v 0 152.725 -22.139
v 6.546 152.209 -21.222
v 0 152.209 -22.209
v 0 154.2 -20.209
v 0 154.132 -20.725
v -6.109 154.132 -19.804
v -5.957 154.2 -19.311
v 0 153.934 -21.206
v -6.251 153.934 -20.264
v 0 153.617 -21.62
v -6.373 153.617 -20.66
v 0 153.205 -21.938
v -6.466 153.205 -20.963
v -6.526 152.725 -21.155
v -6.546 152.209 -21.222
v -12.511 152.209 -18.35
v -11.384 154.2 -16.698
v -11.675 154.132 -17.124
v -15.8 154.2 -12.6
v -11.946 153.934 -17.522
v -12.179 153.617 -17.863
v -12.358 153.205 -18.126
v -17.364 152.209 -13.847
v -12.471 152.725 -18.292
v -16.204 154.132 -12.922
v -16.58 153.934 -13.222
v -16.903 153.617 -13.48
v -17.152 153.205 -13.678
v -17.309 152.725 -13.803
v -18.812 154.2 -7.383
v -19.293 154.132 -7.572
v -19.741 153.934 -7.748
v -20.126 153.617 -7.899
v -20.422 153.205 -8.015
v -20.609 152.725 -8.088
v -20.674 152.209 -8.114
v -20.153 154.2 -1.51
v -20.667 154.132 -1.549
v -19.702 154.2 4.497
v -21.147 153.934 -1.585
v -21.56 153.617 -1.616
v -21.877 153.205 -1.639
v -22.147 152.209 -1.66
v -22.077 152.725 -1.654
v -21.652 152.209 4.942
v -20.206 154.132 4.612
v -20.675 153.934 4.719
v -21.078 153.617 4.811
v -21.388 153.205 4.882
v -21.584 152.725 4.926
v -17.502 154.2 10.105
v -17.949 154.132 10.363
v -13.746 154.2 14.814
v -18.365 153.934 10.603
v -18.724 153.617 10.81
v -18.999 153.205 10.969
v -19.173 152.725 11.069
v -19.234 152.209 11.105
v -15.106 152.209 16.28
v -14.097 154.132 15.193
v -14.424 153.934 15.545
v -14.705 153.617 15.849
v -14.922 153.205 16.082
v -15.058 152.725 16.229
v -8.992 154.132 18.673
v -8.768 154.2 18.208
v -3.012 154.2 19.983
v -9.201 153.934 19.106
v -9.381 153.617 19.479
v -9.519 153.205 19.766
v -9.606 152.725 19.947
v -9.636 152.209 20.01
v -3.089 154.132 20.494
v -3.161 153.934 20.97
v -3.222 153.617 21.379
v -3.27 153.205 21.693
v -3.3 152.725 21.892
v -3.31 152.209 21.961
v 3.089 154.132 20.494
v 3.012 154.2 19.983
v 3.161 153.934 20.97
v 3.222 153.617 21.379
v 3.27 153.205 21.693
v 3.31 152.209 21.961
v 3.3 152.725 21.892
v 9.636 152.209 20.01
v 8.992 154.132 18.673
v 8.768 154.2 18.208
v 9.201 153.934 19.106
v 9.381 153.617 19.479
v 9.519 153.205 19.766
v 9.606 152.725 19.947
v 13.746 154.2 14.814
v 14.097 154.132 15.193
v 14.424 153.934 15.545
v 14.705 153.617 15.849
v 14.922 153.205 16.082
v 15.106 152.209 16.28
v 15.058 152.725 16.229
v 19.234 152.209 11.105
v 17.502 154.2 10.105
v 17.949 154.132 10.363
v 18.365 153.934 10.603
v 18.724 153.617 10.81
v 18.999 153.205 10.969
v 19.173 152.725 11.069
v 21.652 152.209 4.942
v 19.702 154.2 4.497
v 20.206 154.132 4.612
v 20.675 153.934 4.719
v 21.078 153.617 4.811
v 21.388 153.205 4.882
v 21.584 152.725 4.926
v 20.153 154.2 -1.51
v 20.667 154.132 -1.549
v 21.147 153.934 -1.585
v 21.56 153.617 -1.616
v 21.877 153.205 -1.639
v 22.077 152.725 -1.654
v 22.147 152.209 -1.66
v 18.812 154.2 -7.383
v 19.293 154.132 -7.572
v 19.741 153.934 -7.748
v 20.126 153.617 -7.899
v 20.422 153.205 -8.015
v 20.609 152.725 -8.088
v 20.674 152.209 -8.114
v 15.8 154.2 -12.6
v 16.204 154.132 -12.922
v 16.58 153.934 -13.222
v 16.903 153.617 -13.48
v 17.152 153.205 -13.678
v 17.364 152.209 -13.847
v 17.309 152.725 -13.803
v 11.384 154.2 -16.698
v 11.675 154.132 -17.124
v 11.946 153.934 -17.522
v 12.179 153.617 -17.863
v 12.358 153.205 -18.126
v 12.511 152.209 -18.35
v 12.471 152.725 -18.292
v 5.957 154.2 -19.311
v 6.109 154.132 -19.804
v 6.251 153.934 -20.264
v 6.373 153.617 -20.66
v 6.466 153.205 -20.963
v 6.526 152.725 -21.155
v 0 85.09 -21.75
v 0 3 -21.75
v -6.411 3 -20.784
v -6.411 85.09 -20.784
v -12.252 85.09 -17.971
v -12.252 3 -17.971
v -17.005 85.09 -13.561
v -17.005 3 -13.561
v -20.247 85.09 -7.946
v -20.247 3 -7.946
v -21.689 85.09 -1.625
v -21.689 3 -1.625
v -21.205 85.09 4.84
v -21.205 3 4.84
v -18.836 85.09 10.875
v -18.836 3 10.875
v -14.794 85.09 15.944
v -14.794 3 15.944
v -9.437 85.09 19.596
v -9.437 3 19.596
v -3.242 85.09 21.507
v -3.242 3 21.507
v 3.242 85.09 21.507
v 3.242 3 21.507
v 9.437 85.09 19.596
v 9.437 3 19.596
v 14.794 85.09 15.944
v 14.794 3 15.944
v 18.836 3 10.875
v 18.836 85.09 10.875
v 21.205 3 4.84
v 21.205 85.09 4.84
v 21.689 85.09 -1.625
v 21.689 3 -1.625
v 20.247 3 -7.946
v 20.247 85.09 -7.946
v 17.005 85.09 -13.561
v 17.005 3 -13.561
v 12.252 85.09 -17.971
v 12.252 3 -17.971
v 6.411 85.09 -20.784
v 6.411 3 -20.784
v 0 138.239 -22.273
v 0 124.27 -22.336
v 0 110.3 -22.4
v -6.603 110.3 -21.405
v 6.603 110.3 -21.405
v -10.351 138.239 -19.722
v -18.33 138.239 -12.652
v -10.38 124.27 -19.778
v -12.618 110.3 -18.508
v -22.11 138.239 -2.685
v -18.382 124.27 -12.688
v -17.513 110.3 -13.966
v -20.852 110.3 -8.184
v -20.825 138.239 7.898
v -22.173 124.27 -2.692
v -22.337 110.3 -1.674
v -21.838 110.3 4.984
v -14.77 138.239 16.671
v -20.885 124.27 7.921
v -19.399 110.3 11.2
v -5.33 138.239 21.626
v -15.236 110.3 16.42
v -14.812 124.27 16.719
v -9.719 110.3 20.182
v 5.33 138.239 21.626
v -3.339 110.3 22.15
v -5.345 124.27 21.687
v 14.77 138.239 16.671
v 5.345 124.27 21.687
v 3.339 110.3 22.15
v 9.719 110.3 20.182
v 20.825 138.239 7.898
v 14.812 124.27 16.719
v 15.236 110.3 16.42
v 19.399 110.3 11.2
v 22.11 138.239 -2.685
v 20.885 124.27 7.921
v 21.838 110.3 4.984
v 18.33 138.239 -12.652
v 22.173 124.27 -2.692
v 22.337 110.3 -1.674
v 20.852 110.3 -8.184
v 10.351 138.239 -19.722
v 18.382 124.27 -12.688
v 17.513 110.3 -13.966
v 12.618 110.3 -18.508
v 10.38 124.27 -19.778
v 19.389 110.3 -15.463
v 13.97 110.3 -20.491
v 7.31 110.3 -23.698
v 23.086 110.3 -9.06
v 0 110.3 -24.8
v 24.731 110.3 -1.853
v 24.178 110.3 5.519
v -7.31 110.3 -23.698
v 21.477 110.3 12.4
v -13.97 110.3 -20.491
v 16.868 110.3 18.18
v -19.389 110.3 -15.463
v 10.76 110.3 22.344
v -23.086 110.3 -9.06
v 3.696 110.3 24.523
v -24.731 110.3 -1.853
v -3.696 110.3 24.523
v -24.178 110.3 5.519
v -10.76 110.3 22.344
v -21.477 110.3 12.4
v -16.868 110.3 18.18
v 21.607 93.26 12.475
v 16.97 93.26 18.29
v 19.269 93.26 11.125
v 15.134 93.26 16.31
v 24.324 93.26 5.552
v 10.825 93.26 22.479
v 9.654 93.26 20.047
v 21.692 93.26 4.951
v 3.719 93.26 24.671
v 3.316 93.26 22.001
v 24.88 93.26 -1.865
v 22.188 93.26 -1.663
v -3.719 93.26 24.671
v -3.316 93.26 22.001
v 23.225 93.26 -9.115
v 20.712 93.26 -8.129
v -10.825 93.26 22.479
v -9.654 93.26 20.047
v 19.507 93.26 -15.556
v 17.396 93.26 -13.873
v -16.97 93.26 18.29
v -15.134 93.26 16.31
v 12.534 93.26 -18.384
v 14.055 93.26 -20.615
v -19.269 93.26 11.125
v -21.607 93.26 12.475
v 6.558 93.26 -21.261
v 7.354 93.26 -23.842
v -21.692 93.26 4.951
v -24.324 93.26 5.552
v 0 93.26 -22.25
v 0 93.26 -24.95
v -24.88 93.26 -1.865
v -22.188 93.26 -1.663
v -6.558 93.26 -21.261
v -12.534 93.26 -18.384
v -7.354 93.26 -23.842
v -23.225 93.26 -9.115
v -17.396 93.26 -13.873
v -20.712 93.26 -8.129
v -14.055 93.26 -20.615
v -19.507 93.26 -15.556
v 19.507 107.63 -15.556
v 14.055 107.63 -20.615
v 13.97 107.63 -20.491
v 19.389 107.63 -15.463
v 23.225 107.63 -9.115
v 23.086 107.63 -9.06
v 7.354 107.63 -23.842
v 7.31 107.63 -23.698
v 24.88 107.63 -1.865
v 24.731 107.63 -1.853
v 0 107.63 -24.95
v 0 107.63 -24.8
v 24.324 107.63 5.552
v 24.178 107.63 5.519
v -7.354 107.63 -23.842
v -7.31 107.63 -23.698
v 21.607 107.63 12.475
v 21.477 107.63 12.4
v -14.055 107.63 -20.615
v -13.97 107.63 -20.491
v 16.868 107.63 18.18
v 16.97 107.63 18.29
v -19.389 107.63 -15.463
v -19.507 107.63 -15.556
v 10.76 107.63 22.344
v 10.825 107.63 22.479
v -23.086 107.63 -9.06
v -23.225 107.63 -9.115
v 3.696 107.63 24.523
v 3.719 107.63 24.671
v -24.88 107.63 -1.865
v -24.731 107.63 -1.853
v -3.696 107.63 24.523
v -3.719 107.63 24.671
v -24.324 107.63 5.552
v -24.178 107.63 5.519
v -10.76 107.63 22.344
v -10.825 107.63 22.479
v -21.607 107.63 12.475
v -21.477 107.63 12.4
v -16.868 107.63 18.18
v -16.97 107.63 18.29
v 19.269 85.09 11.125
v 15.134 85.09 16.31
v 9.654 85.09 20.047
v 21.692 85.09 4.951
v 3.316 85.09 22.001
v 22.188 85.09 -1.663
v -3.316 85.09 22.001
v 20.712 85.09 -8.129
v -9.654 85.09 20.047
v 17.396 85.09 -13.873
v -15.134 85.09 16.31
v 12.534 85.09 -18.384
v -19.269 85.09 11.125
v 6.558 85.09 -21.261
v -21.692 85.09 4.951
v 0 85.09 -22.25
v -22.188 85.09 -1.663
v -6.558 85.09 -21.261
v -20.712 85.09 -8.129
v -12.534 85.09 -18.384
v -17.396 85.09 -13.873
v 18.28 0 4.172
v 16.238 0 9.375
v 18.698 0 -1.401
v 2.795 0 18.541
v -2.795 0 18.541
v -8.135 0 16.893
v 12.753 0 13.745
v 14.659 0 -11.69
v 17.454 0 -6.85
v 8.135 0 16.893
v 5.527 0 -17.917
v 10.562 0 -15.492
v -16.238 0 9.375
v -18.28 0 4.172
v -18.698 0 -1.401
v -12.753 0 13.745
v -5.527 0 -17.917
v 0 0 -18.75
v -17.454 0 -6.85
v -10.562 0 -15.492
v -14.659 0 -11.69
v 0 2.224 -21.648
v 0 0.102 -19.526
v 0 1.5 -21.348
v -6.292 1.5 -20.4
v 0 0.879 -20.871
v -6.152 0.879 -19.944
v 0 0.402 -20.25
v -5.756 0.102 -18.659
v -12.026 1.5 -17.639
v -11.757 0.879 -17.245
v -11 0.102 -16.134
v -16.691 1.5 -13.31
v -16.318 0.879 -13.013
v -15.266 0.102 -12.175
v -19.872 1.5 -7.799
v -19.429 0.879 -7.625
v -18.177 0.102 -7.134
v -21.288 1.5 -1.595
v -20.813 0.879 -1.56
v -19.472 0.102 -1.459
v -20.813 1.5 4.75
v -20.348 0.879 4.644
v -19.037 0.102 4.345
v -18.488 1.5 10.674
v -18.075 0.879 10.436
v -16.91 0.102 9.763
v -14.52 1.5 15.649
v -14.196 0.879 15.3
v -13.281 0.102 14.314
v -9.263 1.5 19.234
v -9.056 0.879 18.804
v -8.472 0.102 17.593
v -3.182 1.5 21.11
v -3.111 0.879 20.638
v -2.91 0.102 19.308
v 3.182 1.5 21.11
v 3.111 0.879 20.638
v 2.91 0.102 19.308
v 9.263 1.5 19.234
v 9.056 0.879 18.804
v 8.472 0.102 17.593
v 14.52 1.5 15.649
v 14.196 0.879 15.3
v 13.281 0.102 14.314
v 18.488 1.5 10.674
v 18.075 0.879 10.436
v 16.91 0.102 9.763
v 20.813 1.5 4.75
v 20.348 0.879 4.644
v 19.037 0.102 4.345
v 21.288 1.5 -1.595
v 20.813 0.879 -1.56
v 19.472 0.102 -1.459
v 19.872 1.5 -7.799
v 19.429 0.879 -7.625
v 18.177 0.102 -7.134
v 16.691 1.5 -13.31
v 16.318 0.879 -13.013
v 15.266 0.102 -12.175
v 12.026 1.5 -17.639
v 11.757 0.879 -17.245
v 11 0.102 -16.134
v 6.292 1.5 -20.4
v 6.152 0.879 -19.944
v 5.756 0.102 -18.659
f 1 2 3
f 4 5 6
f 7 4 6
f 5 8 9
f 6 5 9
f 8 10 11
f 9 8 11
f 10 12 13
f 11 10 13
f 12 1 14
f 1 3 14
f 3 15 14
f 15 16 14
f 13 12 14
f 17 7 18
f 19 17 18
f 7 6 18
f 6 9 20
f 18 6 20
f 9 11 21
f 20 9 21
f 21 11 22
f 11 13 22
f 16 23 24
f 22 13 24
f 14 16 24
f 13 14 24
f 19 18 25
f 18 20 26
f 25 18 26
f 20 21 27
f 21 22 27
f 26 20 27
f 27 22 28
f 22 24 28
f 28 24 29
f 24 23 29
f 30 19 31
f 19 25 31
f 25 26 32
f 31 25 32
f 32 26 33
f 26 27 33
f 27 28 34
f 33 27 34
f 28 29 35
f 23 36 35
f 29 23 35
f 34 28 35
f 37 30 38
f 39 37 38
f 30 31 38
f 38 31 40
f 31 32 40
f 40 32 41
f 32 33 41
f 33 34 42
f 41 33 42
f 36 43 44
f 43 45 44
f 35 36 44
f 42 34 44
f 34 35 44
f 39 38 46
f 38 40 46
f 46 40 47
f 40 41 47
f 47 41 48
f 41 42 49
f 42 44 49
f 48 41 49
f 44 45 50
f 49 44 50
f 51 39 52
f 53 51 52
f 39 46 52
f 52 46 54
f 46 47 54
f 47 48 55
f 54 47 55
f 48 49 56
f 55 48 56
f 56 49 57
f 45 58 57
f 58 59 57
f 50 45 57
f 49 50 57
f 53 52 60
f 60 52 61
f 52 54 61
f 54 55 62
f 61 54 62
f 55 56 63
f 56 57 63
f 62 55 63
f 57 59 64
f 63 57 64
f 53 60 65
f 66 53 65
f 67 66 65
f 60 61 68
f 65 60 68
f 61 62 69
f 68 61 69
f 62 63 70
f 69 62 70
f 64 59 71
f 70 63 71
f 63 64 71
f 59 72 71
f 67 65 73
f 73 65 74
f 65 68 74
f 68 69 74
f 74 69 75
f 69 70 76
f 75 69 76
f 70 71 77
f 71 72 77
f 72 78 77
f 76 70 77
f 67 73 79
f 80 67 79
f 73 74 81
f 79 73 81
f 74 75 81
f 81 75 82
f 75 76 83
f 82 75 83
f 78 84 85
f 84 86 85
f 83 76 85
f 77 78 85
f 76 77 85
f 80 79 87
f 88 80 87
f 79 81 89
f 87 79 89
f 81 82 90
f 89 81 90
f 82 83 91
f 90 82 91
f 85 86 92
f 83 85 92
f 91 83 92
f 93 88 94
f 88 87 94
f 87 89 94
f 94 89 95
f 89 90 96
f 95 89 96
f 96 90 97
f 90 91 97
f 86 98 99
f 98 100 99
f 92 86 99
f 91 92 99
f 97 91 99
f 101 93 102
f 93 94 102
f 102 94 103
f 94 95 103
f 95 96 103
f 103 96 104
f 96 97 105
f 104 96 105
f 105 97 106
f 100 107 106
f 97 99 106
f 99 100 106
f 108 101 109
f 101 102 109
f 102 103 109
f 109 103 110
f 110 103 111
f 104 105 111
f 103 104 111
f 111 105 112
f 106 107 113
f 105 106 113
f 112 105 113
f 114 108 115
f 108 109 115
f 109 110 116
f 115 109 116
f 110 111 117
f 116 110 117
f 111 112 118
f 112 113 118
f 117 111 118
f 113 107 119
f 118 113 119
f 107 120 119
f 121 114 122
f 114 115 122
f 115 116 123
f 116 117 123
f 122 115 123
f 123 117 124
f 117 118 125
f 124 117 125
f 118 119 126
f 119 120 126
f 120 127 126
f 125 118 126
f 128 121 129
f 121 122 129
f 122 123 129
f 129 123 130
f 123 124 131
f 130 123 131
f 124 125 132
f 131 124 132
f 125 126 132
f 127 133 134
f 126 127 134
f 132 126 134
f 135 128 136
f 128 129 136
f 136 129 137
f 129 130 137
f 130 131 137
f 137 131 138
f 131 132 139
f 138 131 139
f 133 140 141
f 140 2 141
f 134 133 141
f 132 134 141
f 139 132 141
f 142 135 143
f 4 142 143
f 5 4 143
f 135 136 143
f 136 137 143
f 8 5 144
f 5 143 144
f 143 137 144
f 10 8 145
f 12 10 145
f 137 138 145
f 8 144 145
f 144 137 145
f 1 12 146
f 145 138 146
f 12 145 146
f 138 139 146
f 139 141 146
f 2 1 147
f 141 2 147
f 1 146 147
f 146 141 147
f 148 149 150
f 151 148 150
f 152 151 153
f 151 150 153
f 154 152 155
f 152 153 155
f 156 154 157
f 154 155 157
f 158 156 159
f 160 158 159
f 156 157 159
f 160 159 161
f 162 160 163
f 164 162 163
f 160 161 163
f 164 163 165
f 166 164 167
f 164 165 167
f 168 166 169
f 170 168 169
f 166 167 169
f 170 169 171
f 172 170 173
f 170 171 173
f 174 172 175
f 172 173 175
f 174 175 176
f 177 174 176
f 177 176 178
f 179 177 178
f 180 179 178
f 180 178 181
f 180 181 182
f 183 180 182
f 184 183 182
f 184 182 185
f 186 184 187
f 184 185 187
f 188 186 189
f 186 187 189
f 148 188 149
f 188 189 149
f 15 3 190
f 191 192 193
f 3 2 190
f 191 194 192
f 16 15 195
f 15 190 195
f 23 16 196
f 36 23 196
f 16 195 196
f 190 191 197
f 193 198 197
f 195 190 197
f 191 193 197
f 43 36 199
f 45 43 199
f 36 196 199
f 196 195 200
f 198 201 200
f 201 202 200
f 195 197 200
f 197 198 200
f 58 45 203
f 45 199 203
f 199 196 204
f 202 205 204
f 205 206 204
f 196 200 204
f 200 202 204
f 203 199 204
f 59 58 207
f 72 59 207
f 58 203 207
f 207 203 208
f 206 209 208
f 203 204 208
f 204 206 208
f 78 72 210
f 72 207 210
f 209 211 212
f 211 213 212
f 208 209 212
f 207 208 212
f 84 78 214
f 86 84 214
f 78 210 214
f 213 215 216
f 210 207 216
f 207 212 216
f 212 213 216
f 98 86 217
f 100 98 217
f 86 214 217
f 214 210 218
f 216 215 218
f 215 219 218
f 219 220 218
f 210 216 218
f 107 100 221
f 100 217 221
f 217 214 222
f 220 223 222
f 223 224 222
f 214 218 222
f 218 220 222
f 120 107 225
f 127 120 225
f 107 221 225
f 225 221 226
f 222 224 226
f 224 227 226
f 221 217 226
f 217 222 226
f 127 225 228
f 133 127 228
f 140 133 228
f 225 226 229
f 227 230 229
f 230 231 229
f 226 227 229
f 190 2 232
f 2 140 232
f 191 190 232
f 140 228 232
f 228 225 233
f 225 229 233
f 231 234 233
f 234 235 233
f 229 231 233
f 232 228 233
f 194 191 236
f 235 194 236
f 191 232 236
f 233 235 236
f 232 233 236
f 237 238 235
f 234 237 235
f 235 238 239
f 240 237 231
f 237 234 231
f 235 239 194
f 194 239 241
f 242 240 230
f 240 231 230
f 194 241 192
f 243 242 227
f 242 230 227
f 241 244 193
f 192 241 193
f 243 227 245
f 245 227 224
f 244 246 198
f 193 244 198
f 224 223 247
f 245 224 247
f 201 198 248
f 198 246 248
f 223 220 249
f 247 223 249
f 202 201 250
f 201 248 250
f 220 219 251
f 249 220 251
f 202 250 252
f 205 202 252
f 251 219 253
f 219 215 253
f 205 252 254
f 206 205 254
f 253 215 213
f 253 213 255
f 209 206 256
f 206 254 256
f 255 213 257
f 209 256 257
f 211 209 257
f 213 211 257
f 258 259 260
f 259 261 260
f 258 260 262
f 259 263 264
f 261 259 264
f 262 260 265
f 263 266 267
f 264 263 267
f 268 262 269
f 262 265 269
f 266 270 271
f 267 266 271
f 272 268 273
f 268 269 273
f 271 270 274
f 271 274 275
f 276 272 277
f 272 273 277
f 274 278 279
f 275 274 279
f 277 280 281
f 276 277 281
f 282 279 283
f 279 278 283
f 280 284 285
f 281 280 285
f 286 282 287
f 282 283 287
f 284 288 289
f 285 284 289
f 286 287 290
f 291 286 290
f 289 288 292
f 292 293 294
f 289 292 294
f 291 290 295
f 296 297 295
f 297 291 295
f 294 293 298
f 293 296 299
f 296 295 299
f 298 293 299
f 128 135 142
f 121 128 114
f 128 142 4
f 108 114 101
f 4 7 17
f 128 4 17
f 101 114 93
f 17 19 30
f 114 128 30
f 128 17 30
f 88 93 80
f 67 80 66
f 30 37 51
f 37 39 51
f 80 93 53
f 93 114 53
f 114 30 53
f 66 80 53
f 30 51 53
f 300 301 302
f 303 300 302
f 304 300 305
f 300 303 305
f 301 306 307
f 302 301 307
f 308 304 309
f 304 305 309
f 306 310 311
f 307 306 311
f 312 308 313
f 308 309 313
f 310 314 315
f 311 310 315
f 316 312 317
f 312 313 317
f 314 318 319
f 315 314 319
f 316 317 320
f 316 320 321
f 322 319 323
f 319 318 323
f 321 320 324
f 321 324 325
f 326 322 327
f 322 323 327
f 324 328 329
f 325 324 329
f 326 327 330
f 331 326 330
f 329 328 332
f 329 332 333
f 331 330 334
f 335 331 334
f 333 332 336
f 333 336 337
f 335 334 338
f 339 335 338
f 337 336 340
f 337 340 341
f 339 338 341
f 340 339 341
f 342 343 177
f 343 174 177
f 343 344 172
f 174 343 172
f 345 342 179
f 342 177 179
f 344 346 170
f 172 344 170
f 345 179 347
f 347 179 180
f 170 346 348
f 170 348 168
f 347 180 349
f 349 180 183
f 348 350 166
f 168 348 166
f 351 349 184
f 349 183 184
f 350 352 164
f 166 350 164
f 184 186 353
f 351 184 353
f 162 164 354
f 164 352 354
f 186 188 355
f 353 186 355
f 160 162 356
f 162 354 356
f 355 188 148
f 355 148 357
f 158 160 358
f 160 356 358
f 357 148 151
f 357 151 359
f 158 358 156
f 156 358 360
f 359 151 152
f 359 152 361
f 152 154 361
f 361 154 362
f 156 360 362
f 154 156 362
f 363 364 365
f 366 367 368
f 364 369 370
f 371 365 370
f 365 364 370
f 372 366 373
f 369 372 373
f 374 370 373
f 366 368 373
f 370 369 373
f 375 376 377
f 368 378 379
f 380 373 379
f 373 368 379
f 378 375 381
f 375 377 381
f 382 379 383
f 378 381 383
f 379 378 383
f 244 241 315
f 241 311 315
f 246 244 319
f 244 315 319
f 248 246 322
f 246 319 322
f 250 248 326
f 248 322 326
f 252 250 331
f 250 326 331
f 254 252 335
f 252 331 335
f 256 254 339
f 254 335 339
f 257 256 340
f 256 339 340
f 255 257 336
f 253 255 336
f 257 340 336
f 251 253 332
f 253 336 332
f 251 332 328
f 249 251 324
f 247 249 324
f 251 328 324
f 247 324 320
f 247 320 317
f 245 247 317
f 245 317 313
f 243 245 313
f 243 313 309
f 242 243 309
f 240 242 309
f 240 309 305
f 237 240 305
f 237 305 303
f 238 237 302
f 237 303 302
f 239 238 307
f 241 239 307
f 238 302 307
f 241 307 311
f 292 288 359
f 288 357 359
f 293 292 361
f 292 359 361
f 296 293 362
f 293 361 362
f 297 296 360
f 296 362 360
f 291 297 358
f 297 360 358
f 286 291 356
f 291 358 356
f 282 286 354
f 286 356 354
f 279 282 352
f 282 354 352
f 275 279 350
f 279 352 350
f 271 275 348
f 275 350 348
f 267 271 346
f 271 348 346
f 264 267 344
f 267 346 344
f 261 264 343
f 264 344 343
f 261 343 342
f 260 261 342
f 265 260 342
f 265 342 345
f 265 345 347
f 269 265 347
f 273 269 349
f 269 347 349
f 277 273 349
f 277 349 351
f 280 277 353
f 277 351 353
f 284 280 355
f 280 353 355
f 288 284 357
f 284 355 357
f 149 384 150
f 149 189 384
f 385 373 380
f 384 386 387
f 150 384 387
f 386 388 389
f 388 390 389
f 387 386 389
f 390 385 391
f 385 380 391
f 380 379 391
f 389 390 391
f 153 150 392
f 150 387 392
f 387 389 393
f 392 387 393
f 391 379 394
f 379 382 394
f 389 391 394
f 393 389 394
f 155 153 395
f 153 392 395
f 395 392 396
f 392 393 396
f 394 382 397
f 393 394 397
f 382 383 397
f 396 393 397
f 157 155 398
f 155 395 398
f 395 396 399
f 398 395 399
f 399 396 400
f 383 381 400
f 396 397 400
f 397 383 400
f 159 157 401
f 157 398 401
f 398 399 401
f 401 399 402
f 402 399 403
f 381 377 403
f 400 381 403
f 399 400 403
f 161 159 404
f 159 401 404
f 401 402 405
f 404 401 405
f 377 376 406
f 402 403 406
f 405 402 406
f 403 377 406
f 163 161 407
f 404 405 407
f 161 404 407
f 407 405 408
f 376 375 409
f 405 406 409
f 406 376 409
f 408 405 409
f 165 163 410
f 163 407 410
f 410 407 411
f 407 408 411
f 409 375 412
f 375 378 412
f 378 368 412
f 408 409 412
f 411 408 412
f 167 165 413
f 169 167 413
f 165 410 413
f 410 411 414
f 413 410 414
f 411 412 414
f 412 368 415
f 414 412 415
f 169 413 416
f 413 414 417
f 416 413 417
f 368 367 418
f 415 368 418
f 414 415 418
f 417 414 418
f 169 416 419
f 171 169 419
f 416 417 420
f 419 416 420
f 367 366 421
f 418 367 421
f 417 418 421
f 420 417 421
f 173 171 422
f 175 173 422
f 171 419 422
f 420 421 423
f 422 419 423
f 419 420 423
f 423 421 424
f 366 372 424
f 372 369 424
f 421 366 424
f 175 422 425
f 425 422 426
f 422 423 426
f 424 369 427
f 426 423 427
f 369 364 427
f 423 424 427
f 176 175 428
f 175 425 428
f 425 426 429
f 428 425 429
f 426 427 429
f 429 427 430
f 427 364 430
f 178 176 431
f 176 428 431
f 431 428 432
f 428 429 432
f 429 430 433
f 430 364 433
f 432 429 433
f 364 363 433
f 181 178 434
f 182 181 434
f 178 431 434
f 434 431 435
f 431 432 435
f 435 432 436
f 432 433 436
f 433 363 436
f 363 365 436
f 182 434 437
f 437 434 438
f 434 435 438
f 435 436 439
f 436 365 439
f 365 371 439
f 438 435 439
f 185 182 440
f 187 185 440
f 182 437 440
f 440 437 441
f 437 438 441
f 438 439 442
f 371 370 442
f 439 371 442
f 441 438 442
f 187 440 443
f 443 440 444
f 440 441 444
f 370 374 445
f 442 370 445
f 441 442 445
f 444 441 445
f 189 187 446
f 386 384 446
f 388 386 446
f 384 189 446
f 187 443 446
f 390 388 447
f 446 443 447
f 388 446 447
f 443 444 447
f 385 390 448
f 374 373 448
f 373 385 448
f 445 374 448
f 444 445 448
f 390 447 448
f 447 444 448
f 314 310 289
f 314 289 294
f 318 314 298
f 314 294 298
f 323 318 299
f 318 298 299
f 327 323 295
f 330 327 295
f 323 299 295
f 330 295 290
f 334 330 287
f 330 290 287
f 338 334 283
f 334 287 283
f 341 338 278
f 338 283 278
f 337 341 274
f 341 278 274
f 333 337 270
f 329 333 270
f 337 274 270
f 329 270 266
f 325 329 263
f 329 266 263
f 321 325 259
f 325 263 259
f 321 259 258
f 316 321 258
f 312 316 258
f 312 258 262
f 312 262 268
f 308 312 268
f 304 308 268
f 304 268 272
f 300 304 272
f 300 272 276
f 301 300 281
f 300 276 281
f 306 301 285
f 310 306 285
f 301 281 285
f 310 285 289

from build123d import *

# Parameters (mm, degrees)
FILLET1_R = 2
FILLET2_R = 3


with BuildPart() as part:
    # Sketch1 → Revolve1 (revolve)
    with BuildSketch(Plane.XY, mode=Mode.PRIVATE) as revolve1_sk:
        Polygon((0, 0), (0, 154.2), (22.2, 154.2), (22.4, 110.3), (24.8, 110.3), (24.8, 107.63), (24.95, 107.63), (24.95, 93.26), (22.25, 93.26), (22.25, 85.09), (21.75, 85.09), (21.75, 0), align=None)
    revolve(revolve1_sk.sketch.rotate(Axis((0, 0, 0), (0, 1, 0)), 90), axis=Axis((0, 0, 0), (0, 1, 0)))

    # Fillet1
    fillet1_edges = [part.edges().sort_by_distance(p)[0] for p in [
        (0, 154.2, 22.2),
    ]]
    fillet(fillet1_edges, radius=FILLET1_R)

    # Fillet2
    fillet2_edges = [part.edges().sort_by_distance(p)[0] for p in [
        (0, 0, 21.75),
    ]]
    fillet(fillet2_edges, radius=FILLET2_R)


solid = part.part
